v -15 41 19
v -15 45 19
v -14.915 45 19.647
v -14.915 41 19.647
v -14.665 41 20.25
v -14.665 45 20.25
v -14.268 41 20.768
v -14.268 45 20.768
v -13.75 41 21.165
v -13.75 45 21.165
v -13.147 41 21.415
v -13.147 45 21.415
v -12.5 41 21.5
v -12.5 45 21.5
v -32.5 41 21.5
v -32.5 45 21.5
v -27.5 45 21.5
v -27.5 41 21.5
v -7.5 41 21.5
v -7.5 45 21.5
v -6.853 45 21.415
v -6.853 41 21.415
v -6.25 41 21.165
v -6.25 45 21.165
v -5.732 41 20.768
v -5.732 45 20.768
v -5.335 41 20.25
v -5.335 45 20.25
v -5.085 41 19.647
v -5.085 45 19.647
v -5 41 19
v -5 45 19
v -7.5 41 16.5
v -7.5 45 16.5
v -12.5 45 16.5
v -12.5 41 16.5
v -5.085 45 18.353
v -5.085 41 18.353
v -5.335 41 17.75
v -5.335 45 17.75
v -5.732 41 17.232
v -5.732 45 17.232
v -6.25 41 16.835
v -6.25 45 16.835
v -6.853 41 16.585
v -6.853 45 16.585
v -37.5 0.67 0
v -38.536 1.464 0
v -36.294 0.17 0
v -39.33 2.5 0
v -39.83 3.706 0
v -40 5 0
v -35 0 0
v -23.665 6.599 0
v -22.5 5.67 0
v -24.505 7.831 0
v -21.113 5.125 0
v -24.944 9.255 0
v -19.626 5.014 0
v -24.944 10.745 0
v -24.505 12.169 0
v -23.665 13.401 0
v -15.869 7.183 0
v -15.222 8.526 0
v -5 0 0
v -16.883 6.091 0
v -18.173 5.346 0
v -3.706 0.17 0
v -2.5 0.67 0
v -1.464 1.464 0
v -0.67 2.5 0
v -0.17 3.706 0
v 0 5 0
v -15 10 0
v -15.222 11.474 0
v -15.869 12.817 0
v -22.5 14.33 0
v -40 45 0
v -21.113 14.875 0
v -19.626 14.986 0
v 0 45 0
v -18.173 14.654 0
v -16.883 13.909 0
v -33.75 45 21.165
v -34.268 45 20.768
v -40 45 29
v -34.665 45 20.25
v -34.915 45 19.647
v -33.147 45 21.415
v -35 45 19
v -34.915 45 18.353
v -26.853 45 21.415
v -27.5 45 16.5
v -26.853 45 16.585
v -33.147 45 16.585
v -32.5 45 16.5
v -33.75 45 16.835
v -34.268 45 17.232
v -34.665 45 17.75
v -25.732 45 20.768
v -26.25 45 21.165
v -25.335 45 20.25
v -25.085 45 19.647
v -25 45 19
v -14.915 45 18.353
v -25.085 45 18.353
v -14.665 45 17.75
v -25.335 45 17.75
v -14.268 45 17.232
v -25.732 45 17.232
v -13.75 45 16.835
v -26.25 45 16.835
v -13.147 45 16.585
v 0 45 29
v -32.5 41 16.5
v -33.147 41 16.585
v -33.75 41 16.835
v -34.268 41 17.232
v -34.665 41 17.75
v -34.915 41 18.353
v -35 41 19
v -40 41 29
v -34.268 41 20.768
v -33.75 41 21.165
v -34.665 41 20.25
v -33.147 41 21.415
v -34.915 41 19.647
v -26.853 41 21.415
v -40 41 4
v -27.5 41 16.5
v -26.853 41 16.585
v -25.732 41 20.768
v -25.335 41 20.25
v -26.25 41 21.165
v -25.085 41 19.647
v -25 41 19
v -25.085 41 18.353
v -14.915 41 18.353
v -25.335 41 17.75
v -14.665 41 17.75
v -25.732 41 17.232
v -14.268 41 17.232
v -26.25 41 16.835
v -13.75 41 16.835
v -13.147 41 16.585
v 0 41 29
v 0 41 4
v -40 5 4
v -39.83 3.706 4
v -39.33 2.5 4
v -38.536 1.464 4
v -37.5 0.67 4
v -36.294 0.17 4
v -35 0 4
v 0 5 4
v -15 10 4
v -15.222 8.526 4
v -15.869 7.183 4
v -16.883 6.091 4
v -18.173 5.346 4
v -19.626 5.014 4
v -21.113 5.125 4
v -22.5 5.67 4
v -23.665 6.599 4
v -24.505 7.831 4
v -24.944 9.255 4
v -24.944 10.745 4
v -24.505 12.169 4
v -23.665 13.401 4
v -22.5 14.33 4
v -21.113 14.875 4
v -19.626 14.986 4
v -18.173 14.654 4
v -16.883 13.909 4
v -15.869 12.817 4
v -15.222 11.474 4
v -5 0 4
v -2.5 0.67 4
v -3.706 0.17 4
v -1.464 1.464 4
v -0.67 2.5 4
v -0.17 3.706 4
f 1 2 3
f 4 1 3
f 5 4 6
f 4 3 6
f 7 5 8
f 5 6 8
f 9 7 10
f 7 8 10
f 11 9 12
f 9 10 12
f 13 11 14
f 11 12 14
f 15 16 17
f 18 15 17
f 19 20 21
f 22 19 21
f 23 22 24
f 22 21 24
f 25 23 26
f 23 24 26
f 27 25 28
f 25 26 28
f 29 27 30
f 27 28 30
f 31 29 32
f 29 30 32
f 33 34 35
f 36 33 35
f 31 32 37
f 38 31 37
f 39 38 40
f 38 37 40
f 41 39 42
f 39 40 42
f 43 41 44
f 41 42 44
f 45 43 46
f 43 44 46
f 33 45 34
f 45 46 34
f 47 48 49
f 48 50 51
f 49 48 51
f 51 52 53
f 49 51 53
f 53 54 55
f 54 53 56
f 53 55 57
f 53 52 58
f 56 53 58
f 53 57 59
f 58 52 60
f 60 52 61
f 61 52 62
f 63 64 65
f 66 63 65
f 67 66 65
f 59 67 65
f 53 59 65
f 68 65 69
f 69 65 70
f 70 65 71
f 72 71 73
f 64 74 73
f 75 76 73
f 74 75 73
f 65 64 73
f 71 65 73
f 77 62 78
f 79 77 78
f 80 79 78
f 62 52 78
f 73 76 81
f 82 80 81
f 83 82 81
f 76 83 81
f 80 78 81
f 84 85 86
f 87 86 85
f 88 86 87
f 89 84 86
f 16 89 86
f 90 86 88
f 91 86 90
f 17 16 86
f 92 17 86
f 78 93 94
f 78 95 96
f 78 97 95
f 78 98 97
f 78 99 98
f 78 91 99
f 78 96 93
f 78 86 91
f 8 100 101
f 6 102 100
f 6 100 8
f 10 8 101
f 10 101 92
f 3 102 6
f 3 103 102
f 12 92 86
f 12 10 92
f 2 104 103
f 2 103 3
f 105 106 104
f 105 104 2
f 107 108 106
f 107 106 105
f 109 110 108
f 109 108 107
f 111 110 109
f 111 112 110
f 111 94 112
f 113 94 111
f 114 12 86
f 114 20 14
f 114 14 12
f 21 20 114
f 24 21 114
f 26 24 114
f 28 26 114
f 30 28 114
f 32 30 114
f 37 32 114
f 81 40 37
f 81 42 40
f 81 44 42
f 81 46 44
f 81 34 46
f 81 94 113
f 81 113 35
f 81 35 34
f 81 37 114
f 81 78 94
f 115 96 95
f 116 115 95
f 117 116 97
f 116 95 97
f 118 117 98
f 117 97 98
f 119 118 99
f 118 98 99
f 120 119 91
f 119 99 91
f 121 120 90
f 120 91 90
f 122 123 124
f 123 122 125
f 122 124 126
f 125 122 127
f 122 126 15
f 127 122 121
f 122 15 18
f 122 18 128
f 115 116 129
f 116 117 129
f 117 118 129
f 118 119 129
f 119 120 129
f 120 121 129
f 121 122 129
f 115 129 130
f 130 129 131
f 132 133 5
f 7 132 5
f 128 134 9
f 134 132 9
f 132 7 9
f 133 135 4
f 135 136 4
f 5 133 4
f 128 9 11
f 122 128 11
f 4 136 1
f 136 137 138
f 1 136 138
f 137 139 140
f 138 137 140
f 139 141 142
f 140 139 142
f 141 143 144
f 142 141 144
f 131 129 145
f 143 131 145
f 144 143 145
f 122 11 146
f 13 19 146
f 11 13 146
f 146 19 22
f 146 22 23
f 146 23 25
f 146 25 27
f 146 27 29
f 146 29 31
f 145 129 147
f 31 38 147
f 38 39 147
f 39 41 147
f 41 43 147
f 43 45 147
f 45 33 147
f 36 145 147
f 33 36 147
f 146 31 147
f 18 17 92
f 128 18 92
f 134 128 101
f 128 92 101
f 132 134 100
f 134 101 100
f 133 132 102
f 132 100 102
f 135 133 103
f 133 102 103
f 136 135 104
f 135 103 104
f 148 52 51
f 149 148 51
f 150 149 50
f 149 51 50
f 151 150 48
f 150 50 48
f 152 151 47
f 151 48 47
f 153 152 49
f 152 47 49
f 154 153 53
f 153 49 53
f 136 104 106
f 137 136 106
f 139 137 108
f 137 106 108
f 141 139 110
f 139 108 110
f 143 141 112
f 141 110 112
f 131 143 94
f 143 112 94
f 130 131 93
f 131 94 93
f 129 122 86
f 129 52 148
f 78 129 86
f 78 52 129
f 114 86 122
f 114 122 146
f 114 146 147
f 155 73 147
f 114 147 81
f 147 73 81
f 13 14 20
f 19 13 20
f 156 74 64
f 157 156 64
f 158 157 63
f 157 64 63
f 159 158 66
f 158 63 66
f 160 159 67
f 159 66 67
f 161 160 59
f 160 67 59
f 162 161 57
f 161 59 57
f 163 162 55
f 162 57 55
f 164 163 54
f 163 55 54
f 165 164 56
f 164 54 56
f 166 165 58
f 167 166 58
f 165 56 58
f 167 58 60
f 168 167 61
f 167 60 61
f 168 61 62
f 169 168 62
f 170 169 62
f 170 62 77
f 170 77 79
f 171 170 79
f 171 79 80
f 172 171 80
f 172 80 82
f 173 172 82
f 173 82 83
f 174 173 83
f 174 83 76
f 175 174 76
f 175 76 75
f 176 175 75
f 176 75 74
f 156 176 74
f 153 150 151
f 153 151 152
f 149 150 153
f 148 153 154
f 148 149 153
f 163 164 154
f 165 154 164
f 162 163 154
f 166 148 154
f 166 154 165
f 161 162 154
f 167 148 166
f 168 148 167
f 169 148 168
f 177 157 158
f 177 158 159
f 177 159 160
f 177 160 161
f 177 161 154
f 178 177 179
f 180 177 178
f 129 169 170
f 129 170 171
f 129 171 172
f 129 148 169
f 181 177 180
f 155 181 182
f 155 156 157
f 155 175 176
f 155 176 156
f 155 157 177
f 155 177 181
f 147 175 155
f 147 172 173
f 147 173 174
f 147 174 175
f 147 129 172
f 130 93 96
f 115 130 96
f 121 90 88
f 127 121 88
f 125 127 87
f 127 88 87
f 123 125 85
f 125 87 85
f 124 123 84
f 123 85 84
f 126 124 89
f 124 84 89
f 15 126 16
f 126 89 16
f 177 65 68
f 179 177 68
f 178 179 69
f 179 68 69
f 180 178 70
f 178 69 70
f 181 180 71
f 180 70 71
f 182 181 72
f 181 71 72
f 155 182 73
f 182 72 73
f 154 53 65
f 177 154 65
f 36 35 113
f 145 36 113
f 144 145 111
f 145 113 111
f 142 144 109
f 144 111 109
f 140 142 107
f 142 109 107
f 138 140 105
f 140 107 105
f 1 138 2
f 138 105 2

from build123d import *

# Parameters (mm, degrees)
F1_DEPTH = 4
F2_W     = 40
F2_H     = 4
F3_DEPTH = 25
F5_DEPTH = 25
F6_R     = 5
F7_DEPTH = 25


with BuildPart() as f1:
    # F0 (on Top) → F1 (new body)
    with BuildSketch(Plane.XY):
        with BuildLine():
            Line((-35, 0), (-5, 0))
            ThreePointArc((-5, 0), (-1.464466, 1.464466), (0, 5))
            Line((0, 5), (0, 45))
            Line((0, 45), (-40, 45))
            Line((-40, 45), (-40, 5))
            ThreePointArc((-40, 5), (-38.535534, 1.464466), (-35, 0))
        make_face()
    extrude(amount=F1_DEPTH)

    # F2 (on face) → F3 (join)
    with BuildSketch(Plane.XY.offset(4)):
        with Locations((-20, 43)):
            Rectangle(F2_W, F2_H)
    extrude(amount=F3_DEPTH)

    # F4 (on face) → F5 (cut)
    with BuildSketch(Plane(origin=(0, 45, 0), x_dir=(-1, 0, 0), z_dir=(0, 1, 0))):
        with BuildLine():
            ThreePointArc((25, 19), (25.732233, 17.232233), (27.5, 16.5))
            Line((27.5, 16.5), (32.5, 16.5))
            ThreePointArc((32.5, 16.5), (34.267767, 17.232233), (35, 19))
            ThreePointArc((35, 19), (34.267767, 20.767767), (32.5, 21.5))
            Line((32.5, 21.5), (27.5, 21.5))
            ThreePointArc((27.5, 21.5), (25.732233, 20.767767), (25, 19))
        make_face()
        with BuildLine():
            ThreePointArc((5, 19), (5.732233, 17.232233), (7.5, 16.5))
            Line((7.5, 16.5), (12.5, 16.5))
            ThreePointArc((12.5, 16.5), (14.267767, 17.232233), (15, 19))
            ThreePointArc((15, 19), (14.267767, 20.767767), (12.5, 21.5))
            Line((12.5, 21.5), (7.5, 21.5))
            ThreePointArc((7.5, 21.5), (5.732233, 20.767767), (5, 19))
        make_face()
    extrude(amount=-F5_DEPTH, mode=Mode.SUBTRACT)

    # F6 (on face) → F7 (cut)
    with BuildSketch(Plane(origin=(0, 0, 0), x_dir=(1, 0, 0), z_dir=(0, 0, -1))):
        with Locations((-20, -10)):
            Circle(F6_R)
    extrude(amount=-F7_DEPTH, mode=Mode.SUBTRACT)


solid = f1.part
